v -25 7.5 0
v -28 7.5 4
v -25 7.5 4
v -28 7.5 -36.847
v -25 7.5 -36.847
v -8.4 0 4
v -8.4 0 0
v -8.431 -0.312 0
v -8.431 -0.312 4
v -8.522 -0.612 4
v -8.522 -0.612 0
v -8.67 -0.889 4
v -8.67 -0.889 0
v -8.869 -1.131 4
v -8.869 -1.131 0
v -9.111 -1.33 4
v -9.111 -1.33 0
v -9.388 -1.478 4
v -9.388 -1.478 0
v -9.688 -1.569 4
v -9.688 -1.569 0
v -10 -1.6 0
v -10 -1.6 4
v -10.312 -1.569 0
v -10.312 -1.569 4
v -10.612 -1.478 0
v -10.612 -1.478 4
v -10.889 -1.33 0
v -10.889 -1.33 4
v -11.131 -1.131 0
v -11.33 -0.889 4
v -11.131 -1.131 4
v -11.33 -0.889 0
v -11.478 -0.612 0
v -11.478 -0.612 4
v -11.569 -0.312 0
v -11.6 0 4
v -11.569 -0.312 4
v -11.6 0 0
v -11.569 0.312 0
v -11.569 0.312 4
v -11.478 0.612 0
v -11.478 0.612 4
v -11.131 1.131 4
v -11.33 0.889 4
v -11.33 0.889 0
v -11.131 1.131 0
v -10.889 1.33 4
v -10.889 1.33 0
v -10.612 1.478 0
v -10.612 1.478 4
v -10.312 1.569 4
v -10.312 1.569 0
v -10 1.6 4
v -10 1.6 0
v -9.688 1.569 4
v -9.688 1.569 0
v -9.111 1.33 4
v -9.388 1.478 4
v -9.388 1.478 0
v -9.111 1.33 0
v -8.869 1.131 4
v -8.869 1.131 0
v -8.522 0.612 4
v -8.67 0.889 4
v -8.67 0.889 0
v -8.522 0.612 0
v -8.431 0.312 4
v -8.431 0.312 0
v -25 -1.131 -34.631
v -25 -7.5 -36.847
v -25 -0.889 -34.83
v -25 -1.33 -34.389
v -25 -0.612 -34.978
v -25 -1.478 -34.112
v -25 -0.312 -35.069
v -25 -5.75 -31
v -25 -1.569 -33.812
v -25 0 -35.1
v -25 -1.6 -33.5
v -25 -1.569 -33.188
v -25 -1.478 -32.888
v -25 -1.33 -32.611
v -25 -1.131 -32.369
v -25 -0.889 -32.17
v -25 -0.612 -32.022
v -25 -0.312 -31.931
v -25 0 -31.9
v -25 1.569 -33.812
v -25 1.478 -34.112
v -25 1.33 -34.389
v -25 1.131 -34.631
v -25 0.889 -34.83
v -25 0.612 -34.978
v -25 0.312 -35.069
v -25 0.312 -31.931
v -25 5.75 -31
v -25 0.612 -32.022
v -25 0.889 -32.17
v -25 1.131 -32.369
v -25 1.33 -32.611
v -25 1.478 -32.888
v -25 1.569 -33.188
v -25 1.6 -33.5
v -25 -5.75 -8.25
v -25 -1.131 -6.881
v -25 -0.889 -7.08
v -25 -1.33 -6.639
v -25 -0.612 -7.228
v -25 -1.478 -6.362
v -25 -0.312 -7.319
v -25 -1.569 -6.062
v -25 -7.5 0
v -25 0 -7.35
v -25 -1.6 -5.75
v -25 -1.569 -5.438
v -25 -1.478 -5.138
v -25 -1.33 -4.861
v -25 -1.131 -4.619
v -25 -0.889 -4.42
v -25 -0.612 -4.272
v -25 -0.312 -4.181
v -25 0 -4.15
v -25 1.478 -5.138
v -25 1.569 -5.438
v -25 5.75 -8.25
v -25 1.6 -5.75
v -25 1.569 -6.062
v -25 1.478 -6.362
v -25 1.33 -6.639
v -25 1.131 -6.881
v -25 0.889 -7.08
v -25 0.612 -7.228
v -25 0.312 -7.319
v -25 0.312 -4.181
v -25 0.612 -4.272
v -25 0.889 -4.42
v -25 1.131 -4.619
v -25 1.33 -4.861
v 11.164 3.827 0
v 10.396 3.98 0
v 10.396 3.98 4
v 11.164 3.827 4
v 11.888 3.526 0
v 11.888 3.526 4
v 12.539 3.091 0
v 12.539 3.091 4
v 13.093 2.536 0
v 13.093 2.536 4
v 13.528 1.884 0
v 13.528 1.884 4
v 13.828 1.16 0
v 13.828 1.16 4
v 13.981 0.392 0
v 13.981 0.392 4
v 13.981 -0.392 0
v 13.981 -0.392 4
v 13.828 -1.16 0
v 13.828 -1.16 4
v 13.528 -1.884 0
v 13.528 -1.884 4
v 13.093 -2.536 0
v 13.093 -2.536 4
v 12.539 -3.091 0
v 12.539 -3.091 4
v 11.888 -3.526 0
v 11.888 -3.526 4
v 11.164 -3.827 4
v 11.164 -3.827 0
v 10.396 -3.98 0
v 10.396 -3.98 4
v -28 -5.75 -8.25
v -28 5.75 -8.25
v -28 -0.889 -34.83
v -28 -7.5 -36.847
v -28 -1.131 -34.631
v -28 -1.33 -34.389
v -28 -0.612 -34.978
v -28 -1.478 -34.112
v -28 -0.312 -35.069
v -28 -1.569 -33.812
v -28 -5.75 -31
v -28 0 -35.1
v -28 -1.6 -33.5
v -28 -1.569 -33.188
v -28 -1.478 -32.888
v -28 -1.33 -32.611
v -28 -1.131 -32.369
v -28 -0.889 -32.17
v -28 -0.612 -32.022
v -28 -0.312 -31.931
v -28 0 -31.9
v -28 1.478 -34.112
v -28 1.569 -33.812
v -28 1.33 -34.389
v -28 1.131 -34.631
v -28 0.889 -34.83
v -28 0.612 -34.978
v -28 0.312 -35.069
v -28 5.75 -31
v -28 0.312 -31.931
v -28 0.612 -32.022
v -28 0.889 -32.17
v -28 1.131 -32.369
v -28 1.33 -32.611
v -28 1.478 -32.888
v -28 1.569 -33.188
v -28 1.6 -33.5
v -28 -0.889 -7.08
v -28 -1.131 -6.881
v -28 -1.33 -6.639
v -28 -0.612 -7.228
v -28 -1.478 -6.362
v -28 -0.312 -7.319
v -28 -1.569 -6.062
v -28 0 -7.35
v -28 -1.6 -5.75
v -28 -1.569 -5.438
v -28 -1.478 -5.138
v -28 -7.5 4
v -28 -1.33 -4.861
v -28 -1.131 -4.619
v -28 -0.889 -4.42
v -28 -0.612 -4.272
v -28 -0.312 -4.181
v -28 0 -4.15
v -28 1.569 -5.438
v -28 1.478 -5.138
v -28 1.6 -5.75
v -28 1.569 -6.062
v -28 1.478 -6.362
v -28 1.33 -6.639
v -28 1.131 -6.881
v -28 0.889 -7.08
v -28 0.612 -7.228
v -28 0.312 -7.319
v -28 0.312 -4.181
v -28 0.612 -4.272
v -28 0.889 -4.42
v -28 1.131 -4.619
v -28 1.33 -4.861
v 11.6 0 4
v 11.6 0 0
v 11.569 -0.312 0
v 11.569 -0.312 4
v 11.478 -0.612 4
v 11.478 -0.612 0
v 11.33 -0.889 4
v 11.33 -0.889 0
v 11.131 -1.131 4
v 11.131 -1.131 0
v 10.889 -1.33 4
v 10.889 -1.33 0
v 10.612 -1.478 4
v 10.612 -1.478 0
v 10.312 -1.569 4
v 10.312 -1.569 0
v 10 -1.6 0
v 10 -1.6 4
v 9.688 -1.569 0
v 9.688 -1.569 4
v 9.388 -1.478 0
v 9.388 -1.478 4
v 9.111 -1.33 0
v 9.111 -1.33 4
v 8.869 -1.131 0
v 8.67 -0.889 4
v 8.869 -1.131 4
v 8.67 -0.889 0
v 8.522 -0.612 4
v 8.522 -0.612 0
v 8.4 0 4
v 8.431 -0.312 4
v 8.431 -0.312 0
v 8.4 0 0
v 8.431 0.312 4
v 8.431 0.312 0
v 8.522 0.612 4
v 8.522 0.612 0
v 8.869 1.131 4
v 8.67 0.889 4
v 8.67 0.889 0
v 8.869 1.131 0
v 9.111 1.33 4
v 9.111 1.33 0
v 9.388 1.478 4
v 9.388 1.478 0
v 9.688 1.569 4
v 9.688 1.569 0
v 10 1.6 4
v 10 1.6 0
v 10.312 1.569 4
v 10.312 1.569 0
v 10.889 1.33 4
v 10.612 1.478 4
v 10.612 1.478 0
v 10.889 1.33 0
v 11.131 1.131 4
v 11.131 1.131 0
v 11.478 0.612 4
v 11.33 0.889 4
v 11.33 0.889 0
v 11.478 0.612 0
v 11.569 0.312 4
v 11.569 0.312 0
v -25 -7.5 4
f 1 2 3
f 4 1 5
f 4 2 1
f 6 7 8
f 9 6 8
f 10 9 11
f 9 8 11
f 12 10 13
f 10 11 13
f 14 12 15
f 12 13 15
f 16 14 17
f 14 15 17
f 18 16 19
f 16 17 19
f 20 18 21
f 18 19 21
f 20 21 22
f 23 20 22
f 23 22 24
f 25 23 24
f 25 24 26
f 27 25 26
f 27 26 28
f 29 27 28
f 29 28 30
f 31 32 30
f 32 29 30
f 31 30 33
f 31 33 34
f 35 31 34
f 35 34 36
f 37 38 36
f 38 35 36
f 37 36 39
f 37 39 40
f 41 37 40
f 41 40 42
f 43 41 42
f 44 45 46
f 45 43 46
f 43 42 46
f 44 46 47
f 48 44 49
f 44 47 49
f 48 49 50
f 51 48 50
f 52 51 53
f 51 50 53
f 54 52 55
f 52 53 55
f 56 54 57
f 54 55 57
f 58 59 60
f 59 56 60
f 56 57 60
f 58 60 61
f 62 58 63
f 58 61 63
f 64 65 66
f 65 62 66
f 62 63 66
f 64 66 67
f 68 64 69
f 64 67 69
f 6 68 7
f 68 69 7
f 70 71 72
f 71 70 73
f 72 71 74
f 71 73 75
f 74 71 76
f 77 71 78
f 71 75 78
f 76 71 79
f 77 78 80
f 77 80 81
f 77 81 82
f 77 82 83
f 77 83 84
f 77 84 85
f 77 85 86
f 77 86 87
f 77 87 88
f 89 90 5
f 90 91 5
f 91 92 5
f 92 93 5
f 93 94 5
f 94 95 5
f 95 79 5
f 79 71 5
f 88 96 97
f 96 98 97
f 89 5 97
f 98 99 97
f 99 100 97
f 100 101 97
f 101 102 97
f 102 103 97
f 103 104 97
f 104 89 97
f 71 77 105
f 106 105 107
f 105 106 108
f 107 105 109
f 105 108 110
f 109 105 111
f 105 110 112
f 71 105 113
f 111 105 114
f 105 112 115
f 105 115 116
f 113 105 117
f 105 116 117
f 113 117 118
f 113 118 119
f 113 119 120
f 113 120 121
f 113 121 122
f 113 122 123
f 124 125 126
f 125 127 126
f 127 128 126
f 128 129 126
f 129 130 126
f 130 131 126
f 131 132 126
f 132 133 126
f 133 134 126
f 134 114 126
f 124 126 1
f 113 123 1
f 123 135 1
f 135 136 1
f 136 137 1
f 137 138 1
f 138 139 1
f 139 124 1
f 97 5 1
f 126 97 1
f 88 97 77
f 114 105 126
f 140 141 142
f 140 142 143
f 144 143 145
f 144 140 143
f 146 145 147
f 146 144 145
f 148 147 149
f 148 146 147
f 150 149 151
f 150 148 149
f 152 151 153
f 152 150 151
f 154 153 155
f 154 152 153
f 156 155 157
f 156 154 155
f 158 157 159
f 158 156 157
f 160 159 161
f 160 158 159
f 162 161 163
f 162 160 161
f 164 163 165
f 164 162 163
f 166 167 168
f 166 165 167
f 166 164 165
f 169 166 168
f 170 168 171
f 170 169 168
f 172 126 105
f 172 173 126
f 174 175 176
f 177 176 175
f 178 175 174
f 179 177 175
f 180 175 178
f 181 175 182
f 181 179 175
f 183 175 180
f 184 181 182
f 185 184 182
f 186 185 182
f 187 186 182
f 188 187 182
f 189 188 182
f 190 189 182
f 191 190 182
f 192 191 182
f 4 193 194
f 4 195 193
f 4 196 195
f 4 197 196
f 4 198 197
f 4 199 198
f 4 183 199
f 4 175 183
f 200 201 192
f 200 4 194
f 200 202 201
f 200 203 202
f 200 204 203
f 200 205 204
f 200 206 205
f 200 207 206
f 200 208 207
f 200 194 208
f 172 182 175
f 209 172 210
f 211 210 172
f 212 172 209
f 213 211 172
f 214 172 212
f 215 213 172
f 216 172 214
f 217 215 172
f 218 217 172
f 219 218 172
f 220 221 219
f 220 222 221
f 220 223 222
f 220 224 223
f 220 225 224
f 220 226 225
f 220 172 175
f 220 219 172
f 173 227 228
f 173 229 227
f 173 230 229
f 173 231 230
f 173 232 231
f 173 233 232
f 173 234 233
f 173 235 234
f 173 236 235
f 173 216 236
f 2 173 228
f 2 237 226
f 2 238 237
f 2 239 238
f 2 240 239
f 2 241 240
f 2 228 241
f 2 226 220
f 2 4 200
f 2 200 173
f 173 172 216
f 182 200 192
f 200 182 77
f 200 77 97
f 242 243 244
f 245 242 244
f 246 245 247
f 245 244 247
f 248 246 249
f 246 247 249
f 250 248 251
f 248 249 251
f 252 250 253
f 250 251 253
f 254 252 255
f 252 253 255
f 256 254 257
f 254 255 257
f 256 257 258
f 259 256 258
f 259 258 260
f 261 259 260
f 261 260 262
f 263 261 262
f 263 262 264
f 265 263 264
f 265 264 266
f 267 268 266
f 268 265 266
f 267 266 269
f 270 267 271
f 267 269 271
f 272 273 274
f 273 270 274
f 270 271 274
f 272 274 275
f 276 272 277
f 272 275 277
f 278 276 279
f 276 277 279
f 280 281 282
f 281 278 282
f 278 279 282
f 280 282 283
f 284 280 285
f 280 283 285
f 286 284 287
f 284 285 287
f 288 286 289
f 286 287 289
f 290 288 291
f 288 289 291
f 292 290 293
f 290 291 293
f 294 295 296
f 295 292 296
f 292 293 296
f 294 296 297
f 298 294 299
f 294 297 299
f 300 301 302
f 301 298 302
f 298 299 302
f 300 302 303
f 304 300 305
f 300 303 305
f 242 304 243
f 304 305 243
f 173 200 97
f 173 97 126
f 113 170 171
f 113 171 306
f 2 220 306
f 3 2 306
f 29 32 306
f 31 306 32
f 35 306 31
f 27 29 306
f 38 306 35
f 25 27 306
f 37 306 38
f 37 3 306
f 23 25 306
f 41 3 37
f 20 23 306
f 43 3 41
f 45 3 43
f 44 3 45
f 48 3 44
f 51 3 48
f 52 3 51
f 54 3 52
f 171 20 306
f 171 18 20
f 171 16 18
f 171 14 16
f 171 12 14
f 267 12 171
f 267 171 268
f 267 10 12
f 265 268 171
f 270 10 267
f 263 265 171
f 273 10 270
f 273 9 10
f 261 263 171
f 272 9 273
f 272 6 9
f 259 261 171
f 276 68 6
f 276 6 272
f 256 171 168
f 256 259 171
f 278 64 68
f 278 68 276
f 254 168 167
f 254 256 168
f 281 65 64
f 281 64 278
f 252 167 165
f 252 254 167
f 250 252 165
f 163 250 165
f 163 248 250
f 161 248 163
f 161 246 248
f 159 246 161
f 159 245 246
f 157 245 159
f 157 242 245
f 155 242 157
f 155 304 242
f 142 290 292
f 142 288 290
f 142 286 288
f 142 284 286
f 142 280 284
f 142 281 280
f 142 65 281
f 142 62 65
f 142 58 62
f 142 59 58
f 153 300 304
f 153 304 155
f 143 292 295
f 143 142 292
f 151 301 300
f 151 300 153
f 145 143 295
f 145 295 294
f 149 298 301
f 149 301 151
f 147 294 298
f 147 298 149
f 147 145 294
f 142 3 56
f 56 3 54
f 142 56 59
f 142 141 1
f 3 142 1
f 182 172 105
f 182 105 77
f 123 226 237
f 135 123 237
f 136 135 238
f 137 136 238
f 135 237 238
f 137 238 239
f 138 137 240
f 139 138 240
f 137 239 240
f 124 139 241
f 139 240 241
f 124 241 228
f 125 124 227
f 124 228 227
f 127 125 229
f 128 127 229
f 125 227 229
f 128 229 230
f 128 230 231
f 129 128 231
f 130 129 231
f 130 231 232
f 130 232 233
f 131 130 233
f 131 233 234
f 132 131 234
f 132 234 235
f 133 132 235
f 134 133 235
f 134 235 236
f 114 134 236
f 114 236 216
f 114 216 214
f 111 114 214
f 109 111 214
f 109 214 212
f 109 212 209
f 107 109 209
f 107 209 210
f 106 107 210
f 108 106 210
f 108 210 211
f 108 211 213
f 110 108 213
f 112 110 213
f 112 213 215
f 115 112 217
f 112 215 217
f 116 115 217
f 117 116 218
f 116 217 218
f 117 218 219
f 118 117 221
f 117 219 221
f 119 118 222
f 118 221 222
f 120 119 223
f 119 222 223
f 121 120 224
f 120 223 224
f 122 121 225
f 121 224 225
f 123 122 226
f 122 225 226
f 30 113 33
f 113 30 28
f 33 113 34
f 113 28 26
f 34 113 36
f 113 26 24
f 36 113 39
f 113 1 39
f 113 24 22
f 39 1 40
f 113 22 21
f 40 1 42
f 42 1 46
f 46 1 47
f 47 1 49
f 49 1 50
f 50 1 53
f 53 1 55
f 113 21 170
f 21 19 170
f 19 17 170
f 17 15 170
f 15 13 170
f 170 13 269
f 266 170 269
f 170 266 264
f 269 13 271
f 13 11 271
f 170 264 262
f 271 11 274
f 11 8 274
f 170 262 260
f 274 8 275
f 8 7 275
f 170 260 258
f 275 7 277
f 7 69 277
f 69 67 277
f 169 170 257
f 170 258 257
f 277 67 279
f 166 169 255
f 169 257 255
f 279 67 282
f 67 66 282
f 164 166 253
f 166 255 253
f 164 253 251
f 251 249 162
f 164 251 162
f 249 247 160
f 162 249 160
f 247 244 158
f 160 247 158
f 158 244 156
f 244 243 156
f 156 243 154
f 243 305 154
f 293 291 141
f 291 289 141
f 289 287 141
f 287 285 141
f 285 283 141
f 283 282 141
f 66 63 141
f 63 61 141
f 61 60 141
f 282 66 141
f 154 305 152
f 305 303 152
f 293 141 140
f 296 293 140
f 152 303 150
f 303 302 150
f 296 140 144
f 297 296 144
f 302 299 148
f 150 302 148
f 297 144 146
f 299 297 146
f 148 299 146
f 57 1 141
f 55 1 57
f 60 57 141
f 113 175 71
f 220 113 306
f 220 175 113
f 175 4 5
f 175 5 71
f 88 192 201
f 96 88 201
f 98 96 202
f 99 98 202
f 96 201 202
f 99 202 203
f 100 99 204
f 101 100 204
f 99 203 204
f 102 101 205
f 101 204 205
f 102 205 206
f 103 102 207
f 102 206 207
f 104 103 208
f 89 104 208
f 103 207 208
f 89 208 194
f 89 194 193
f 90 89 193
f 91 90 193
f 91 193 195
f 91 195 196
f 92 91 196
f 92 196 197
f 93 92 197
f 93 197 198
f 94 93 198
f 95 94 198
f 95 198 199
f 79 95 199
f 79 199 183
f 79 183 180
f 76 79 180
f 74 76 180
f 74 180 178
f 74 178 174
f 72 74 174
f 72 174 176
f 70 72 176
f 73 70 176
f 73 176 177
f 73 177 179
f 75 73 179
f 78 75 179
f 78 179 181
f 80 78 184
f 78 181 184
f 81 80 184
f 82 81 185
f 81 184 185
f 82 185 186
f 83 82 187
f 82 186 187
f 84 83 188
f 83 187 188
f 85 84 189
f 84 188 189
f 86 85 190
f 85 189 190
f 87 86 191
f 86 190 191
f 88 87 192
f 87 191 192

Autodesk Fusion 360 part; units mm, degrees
sketch "Skizze1" plane through (0, 0, 0) normal (0, 0, 1) x (1, 0, 0)
  circle A0 centre (-10, 0) radius 1.6
  circle A1 centre (10, 0) radius 1.6
  line L0 (0, 0) -> (0, 16.8871) construction
  arc A2 (10.3958, -3.9804) -> (10.3958, 3.9804) centre (10, 0) ccw
  line L1 (-28, 7.5) -> (-28, -7.5)
  line L2 (10, 0) -> (-66, 0) construction
  line L3 (-25, 7.5) -> (-25, -7.5)
  line L4 (10.3958, 3.9804) -> (-25, 7.5)
  line L5 (10.3958, -3.9804) -> (-25, -7.5)
  line L6 (-25, -7.5) -> (-28, -7.5)
  line L7 (-25, 7.5) -> (-28, 7.5)
  dimension "d1" = 20
  dimension "d2" = 4
  dimension "d3" = 3.2
  dimension "d4" = 28
  dimension "d18" = 15
  dimension "d19" = 3
extrude "Extrusion1" add sketch "Skizze1" along normal blind 4
sketch "Skizze2" plane through (-28, 0, 0) normal (-1, 0, 0) x (0, 0, 1)
  line L0 (0, 7.5) -> (0, -7.5)
  line L1 (4, -7.5) -> (4, 7.5)
  circle A0 centre (-5.75, 0) radius 1.6
  circle A1 centre (-33.5, 0) radius 1.6
  line L2 (-31, -5.75) -> (-31, 5.75)
  line L3 (-31, 5.75) -> (-8.25, 5.75)
  line L4 (-8.25, 5.75) -> (-8.25, -5.75)
  line L5 (-8.25, -5.75) -> (-31, -5.75)
  line L6 (-36.847, 7.5) -> (-36.847, -7.5)
  line L7 (-36.847, -7.5) -> (4, -7.5)
  line L8 (4, -7.5) -> (4, 7.5)
  line L9 (4, 7.5) -> (-36.847, 7.5)
  line L10 (-33.1, 0) -> (0, 0) construction
  circle A2 centre (-25, 0) radius 1.4142 construction
  line L11 (0, -7.5) -> (4, -7.5)
  line L12 (4, 7.5) -> (0, 7.5)
  dimension "d7" = 3.2
  dimension "d8" = 27.75
  dimension "d9" = 19.25
  dimension "d11" = 2.5
  dimension "d12" = 2.5
  dimension "d15" = 25
  dimension "d16" = 15
  dimension "d17" = 11.5
extrude "Extrusion2" add sketch "Skizze2" against normal blind 3 contours L0 L6 L7 L9
